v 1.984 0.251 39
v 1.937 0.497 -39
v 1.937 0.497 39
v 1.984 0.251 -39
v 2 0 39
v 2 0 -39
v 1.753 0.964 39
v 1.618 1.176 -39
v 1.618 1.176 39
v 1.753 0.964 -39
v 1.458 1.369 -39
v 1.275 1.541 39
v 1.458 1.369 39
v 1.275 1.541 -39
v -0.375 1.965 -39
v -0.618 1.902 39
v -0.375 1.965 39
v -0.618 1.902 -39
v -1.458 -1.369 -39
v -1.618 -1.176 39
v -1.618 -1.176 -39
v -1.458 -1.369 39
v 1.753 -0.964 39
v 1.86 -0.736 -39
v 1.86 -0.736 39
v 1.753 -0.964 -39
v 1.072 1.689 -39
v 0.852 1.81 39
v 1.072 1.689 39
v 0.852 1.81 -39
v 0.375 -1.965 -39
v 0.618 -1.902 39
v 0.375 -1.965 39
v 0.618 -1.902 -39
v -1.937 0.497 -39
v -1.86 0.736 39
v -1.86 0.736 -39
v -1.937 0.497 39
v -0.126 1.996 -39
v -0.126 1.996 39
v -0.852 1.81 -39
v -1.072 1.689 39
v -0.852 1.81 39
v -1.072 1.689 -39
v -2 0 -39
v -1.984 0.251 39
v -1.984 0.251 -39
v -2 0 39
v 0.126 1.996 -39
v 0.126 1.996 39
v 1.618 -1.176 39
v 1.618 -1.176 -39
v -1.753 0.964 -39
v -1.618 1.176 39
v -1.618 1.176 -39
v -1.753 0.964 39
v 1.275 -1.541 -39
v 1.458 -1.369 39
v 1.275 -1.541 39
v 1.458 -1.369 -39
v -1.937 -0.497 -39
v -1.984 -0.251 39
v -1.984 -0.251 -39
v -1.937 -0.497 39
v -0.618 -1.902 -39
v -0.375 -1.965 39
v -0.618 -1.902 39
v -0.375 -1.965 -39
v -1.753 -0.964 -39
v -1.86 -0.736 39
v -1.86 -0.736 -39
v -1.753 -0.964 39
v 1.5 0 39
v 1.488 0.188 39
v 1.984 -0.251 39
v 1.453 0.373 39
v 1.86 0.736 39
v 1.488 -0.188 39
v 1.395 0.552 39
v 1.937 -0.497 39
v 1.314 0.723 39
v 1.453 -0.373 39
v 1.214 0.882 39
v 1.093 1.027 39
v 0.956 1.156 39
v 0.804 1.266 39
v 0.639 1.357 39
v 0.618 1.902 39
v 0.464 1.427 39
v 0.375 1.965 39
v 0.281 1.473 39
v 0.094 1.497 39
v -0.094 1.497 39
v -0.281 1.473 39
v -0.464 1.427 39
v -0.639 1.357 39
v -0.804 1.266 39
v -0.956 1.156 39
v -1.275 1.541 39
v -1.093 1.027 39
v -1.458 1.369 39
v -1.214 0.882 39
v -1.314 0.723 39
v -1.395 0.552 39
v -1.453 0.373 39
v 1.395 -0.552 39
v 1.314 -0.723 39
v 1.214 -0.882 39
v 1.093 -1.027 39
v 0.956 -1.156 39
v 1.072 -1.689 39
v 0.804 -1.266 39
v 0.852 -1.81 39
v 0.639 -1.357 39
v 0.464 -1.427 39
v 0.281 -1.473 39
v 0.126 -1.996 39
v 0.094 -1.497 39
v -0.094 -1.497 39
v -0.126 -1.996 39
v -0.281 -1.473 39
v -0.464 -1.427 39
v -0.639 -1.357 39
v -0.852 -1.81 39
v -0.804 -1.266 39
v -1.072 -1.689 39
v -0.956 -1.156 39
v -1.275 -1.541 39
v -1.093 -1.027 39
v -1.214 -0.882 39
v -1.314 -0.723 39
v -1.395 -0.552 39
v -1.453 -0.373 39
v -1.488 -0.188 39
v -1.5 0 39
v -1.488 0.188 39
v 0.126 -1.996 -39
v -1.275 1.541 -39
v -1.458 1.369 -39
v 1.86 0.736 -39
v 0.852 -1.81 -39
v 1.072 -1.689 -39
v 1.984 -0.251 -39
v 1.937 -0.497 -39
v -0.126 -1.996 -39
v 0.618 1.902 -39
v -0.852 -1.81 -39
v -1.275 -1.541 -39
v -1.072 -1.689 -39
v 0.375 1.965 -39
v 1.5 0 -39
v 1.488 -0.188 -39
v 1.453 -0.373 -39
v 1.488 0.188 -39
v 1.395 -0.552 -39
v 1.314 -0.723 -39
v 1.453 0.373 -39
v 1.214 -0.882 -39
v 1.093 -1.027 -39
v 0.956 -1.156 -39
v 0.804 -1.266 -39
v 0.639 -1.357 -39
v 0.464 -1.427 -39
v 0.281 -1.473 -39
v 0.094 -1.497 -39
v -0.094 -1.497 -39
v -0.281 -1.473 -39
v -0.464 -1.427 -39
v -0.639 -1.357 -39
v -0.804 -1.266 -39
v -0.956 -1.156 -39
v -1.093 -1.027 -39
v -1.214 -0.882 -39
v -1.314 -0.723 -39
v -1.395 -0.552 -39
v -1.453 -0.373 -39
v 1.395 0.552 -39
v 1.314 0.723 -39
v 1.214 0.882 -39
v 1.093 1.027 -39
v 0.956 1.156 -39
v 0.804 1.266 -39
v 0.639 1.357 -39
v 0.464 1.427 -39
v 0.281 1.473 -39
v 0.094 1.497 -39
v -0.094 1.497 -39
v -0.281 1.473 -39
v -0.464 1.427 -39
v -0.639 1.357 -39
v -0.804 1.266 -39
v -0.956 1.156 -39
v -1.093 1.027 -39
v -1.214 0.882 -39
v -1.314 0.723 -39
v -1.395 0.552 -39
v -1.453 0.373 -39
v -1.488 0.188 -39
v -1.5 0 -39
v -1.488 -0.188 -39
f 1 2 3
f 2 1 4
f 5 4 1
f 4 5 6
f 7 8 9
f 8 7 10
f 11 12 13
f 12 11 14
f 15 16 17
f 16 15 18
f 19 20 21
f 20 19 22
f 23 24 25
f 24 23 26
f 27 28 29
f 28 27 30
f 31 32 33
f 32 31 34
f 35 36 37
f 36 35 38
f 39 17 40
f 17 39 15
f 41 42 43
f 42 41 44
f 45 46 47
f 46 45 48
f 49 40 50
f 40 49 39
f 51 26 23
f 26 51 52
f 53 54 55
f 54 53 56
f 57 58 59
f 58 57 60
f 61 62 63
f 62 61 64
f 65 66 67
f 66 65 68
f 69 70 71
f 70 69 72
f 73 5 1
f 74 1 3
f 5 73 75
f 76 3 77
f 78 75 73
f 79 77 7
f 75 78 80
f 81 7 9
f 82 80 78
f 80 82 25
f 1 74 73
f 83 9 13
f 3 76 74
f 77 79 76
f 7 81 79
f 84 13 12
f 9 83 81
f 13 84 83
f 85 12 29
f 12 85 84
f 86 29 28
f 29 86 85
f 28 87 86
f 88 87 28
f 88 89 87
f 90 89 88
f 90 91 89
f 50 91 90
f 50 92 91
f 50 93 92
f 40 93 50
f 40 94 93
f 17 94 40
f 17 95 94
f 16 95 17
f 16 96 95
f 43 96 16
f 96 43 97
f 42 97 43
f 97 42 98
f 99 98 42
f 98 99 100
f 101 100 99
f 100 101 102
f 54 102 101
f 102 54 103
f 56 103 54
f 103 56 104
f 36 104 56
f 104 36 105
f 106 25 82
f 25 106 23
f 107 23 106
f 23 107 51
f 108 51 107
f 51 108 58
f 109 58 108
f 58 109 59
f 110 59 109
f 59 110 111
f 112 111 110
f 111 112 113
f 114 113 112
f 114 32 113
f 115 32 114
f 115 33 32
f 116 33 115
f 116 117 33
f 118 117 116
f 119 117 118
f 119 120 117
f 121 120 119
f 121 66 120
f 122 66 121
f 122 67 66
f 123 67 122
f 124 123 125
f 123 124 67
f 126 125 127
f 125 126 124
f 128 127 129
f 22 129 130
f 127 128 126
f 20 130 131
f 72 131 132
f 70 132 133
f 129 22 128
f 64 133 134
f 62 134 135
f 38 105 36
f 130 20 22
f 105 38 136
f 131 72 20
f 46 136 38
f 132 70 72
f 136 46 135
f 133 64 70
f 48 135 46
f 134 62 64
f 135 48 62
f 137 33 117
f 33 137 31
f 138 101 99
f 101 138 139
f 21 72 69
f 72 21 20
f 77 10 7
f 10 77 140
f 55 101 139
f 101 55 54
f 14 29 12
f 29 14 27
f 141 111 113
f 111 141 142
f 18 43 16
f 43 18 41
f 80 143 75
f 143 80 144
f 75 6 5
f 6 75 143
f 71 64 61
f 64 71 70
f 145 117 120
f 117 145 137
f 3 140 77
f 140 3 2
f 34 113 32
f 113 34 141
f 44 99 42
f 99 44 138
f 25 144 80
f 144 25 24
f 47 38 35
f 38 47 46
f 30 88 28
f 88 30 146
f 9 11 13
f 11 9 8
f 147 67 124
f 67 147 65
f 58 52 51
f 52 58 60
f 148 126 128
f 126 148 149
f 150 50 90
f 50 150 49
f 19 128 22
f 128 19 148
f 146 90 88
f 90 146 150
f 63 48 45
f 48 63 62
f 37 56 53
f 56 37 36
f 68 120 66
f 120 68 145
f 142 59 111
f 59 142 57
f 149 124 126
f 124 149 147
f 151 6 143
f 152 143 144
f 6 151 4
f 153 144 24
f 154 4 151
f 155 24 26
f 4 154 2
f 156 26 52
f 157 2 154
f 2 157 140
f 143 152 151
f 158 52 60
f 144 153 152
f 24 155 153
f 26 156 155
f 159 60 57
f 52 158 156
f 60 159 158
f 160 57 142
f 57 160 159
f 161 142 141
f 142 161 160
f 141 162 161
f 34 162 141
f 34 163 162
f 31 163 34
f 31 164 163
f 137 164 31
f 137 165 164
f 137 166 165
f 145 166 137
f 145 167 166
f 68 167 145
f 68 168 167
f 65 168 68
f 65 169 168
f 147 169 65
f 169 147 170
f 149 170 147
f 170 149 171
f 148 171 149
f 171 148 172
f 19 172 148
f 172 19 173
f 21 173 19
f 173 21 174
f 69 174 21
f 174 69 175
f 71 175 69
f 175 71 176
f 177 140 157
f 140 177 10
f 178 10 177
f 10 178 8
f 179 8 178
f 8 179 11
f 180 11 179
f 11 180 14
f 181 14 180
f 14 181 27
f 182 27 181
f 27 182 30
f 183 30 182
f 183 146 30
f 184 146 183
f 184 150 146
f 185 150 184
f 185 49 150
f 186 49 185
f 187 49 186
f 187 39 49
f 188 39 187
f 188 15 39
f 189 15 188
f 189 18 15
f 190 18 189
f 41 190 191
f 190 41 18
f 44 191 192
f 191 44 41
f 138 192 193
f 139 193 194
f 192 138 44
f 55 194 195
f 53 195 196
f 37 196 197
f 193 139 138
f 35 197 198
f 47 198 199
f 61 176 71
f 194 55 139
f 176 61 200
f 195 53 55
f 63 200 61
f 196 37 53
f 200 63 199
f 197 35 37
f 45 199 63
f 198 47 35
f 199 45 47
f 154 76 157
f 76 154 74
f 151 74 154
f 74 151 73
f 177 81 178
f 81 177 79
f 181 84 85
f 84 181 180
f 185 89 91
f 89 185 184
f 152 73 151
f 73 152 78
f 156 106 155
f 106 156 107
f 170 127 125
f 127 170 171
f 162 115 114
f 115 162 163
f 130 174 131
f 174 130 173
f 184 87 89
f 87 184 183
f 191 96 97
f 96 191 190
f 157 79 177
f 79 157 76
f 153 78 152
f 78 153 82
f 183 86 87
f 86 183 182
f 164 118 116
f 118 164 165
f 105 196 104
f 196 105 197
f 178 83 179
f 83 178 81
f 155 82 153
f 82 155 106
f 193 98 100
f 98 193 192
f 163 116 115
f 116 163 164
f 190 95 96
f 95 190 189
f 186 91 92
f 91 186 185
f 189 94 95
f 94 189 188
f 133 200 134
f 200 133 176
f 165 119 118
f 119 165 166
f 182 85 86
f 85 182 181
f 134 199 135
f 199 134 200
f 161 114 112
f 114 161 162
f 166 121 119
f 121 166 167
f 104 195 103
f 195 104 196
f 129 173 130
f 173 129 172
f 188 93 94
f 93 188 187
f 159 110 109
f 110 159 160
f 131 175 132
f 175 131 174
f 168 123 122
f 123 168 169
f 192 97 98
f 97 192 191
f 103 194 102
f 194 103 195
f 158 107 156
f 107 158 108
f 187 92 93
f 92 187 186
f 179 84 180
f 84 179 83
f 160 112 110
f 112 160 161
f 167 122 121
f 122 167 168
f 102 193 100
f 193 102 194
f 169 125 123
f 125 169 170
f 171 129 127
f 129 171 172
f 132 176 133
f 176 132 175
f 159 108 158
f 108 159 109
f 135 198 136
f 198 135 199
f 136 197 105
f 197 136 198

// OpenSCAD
$fn = 50;


difference() {
	union() {
		translate(v = [0, 0, -39.0000000000]) {
			cylinder(h = 78, r = 2.0000000000);
		}
	}
	union() {
		translate(v = [0, 0, -100.0000000000]) {
			cylinder(h = 200, r = 1.5000000000);
		}
	}
}
